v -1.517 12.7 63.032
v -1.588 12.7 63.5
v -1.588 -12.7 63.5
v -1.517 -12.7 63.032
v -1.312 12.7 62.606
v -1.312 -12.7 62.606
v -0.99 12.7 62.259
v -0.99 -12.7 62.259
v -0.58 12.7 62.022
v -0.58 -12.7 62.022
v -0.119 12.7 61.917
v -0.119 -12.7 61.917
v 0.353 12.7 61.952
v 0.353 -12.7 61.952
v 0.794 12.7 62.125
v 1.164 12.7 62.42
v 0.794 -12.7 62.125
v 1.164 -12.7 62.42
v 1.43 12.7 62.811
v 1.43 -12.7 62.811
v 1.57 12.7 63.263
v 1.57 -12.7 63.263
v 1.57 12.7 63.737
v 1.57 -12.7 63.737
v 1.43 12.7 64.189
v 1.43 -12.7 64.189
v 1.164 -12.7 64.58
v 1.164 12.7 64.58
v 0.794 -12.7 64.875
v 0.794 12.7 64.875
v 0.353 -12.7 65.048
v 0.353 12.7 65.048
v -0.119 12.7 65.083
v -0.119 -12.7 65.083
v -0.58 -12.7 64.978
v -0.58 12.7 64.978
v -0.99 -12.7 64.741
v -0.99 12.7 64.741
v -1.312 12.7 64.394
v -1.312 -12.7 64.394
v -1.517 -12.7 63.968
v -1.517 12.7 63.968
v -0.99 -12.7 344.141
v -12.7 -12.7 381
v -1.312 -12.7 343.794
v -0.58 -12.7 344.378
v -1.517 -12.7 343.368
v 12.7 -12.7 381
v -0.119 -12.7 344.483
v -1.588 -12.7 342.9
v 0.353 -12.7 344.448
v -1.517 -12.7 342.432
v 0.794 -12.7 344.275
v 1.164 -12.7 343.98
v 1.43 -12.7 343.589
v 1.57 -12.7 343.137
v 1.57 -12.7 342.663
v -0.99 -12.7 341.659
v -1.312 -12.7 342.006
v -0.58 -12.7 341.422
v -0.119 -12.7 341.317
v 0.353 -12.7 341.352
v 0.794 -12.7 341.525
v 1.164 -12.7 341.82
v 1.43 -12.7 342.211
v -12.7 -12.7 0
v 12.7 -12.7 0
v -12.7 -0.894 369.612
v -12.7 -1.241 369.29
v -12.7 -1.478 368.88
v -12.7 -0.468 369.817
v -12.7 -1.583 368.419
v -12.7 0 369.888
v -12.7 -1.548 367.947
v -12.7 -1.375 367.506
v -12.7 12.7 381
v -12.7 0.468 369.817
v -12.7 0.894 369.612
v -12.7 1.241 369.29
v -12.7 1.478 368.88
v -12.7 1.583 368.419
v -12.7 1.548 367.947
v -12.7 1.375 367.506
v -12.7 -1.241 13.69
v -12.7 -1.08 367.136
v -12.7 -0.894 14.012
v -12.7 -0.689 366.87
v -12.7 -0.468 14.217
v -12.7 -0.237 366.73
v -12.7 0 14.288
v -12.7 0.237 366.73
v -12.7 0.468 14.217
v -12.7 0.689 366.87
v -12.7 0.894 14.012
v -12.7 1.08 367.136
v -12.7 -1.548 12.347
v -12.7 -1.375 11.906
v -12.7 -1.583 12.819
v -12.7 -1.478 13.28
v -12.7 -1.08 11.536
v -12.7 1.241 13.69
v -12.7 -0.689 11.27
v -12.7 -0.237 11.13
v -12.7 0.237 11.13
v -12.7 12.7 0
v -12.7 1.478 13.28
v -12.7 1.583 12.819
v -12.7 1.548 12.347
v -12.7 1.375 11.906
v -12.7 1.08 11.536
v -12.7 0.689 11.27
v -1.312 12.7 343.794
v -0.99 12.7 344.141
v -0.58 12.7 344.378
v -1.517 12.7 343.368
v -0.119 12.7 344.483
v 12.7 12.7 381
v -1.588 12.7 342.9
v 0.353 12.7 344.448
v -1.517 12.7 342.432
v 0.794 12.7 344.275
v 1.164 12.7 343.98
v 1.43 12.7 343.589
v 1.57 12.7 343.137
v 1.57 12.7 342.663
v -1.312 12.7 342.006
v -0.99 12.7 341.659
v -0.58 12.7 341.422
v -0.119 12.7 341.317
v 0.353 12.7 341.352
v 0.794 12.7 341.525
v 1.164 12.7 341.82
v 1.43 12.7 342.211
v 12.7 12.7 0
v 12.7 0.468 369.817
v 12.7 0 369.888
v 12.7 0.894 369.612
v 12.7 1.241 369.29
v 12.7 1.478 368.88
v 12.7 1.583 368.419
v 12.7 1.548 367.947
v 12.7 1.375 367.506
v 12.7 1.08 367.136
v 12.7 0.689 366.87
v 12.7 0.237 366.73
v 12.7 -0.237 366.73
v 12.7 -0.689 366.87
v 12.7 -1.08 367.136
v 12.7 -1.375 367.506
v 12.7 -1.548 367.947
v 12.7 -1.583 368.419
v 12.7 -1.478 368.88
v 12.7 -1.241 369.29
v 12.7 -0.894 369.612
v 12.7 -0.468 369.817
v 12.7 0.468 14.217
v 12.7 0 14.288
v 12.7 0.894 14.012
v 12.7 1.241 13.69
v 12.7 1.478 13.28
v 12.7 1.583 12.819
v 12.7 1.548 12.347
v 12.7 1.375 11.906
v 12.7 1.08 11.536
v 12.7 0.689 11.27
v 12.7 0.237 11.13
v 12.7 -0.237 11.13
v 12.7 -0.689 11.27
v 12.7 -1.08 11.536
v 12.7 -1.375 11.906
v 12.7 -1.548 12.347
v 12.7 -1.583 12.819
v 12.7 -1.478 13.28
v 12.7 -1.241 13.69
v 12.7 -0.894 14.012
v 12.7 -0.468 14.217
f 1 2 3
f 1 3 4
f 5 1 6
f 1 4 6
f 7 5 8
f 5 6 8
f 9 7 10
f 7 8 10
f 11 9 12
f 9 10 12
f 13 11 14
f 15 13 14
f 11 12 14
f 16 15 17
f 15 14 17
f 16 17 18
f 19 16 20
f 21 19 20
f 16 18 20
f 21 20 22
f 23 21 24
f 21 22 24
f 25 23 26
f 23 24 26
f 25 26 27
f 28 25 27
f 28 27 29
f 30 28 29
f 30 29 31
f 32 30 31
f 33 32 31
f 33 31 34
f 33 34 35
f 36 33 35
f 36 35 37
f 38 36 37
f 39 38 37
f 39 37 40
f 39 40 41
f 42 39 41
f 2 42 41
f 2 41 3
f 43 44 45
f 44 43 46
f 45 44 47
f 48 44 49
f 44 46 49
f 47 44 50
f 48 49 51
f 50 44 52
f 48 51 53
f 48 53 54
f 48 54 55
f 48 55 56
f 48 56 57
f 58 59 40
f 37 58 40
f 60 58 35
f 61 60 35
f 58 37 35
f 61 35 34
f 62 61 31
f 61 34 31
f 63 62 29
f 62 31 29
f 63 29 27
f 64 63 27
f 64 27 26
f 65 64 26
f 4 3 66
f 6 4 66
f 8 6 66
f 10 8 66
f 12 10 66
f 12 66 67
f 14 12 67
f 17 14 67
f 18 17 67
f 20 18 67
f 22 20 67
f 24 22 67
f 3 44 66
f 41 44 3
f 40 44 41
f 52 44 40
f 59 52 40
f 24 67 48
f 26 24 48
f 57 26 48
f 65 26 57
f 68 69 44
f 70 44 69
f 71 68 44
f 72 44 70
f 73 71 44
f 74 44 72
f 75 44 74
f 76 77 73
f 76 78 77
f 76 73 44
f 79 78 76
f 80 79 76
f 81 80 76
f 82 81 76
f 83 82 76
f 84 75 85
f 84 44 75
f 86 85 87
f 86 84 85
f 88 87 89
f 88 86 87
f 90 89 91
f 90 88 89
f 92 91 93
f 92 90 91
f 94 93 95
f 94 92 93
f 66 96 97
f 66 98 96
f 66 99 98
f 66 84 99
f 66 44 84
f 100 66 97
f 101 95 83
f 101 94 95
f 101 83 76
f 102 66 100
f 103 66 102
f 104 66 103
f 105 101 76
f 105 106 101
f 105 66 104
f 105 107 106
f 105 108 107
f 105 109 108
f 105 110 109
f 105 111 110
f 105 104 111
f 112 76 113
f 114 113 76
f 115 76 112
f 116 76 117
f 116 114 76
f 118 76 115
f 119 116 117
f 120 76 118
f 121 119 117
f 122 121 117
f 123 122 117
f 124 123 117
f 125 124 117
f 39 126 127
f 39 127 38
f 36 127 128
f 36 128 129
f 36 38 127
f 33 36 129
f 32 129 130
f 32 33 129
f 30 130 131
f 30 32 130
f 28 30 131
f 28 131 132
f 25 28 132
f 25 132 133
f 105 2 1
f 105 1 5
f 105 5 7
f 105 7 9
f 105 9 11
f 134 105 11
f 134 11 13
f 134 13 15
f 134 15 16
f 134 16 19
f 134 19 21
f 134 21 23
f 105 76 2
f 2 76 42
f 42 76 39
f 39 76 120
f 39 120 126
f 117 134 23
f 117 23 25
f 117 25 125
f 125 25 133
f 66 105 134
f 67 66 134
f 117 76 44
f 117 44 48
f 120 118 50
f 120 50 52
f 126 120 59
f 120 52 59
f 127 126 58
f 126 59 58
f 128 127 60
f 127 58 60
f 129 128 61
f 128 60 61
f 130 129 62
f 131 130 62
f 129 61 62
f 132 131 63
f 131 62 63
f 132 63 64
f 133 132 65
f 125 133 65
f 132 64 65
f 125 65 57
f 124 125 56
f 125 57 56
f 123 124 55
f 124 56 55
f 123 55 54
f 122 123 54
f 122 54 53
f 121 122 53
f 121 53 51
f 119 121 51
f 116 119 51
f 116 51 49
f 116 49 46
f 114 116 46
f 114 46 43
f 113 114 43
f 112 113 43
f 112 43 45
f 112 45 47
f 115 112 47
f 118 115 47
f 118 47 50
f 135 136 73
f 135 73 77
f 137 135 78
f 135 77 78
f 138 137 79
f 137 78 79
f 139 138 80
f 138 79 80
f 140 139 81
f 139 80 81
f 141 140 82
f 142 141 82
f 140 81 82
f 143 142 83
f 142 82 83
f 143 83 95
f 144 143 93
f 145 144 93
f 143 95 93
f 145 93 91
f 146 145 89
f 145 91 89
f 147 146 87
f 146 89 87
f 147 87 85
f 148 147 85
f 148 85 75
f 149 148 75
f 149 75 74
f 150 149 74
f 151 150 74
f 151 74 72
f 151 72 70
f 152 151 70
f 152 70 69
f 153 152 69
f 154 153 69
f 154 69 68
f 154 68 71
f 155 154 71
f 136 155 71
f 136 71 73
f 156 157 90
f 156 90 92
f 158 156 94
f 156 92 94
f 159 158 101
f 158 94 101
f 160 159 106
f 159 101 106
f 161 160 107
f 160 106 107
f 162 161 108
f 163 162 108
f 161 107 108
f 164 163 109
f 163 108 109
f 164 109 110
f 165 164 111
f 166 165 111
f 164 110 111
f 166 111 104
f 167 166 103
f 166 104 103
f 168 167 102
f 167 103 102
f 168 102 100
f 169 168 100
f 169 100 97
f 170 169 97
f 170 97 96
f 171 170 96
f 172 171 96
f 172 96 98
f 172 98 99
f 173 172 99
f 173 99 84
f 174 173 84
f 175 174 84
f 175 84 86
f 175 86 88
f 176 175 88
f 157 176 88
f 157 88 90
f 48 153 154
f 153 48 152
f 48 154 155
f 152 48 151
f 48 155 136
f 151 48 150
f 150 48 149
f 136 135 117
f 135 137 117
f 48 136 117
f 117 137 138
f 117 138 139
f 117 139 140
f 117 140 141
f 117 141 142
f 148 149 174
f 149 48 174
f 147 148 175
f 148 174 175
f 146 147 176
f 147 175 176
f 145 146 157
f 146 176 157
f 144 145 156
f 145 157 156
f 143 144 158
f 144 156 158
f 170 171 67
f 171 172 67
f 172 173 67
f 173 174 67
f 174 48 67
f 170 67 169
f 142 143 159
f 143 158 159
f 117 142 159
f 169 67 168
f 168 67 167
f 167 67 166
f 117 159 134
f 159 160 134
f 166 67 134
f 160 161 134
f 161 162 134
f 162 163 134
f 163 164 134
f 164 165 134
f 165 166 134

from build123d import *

# Parameters (mm, degrees)
SKETCH6_W                    = 25.4
SKETCH6_H                    = 25.4
BOSS_EXTRUDE1_DEPTH          = 381
F_1_8_0_125_DIAMETER_HOLE2_D = 3.175
F_1_8_0_125_DIAMETER_HOLE3_D = 3.175


with BuildPart() as part:
    # Sketch6 → Boss-Extrude1 (new body)
    with BuildSketch(Plane.XY):
        Rectangle(SKETCH6_W, SKETCH6_H)
    extrude(amount=BOSS_EXTRUDE1_DEPTH)

    # 1/8 (0.125) Diameter Hole2 (through all)
    with Locations(Plane(origin=(12.7, 0, 0), x_dir=(0, 0, -1), z_dir=(1, 0, 0))):
        with Locations((-12.7, 0), (-368.3, 0)):
            Hole(F_1_8_0_125_DIAMETER_HOLE2_D / 2)

    # 1/8 (0.125) Diameter Hole3 (through all)
    with Locations(Plane(origin=(0, 12.7, 0), x_dir=(1, 0, 0), z_dir=(0, 1, 0))):
        with Locations((0, -63.5), (0, -342.9)):
            Hole(F_1_8_0_125_DIAMETER_HOLE3_D / 2)


solid = part.part
